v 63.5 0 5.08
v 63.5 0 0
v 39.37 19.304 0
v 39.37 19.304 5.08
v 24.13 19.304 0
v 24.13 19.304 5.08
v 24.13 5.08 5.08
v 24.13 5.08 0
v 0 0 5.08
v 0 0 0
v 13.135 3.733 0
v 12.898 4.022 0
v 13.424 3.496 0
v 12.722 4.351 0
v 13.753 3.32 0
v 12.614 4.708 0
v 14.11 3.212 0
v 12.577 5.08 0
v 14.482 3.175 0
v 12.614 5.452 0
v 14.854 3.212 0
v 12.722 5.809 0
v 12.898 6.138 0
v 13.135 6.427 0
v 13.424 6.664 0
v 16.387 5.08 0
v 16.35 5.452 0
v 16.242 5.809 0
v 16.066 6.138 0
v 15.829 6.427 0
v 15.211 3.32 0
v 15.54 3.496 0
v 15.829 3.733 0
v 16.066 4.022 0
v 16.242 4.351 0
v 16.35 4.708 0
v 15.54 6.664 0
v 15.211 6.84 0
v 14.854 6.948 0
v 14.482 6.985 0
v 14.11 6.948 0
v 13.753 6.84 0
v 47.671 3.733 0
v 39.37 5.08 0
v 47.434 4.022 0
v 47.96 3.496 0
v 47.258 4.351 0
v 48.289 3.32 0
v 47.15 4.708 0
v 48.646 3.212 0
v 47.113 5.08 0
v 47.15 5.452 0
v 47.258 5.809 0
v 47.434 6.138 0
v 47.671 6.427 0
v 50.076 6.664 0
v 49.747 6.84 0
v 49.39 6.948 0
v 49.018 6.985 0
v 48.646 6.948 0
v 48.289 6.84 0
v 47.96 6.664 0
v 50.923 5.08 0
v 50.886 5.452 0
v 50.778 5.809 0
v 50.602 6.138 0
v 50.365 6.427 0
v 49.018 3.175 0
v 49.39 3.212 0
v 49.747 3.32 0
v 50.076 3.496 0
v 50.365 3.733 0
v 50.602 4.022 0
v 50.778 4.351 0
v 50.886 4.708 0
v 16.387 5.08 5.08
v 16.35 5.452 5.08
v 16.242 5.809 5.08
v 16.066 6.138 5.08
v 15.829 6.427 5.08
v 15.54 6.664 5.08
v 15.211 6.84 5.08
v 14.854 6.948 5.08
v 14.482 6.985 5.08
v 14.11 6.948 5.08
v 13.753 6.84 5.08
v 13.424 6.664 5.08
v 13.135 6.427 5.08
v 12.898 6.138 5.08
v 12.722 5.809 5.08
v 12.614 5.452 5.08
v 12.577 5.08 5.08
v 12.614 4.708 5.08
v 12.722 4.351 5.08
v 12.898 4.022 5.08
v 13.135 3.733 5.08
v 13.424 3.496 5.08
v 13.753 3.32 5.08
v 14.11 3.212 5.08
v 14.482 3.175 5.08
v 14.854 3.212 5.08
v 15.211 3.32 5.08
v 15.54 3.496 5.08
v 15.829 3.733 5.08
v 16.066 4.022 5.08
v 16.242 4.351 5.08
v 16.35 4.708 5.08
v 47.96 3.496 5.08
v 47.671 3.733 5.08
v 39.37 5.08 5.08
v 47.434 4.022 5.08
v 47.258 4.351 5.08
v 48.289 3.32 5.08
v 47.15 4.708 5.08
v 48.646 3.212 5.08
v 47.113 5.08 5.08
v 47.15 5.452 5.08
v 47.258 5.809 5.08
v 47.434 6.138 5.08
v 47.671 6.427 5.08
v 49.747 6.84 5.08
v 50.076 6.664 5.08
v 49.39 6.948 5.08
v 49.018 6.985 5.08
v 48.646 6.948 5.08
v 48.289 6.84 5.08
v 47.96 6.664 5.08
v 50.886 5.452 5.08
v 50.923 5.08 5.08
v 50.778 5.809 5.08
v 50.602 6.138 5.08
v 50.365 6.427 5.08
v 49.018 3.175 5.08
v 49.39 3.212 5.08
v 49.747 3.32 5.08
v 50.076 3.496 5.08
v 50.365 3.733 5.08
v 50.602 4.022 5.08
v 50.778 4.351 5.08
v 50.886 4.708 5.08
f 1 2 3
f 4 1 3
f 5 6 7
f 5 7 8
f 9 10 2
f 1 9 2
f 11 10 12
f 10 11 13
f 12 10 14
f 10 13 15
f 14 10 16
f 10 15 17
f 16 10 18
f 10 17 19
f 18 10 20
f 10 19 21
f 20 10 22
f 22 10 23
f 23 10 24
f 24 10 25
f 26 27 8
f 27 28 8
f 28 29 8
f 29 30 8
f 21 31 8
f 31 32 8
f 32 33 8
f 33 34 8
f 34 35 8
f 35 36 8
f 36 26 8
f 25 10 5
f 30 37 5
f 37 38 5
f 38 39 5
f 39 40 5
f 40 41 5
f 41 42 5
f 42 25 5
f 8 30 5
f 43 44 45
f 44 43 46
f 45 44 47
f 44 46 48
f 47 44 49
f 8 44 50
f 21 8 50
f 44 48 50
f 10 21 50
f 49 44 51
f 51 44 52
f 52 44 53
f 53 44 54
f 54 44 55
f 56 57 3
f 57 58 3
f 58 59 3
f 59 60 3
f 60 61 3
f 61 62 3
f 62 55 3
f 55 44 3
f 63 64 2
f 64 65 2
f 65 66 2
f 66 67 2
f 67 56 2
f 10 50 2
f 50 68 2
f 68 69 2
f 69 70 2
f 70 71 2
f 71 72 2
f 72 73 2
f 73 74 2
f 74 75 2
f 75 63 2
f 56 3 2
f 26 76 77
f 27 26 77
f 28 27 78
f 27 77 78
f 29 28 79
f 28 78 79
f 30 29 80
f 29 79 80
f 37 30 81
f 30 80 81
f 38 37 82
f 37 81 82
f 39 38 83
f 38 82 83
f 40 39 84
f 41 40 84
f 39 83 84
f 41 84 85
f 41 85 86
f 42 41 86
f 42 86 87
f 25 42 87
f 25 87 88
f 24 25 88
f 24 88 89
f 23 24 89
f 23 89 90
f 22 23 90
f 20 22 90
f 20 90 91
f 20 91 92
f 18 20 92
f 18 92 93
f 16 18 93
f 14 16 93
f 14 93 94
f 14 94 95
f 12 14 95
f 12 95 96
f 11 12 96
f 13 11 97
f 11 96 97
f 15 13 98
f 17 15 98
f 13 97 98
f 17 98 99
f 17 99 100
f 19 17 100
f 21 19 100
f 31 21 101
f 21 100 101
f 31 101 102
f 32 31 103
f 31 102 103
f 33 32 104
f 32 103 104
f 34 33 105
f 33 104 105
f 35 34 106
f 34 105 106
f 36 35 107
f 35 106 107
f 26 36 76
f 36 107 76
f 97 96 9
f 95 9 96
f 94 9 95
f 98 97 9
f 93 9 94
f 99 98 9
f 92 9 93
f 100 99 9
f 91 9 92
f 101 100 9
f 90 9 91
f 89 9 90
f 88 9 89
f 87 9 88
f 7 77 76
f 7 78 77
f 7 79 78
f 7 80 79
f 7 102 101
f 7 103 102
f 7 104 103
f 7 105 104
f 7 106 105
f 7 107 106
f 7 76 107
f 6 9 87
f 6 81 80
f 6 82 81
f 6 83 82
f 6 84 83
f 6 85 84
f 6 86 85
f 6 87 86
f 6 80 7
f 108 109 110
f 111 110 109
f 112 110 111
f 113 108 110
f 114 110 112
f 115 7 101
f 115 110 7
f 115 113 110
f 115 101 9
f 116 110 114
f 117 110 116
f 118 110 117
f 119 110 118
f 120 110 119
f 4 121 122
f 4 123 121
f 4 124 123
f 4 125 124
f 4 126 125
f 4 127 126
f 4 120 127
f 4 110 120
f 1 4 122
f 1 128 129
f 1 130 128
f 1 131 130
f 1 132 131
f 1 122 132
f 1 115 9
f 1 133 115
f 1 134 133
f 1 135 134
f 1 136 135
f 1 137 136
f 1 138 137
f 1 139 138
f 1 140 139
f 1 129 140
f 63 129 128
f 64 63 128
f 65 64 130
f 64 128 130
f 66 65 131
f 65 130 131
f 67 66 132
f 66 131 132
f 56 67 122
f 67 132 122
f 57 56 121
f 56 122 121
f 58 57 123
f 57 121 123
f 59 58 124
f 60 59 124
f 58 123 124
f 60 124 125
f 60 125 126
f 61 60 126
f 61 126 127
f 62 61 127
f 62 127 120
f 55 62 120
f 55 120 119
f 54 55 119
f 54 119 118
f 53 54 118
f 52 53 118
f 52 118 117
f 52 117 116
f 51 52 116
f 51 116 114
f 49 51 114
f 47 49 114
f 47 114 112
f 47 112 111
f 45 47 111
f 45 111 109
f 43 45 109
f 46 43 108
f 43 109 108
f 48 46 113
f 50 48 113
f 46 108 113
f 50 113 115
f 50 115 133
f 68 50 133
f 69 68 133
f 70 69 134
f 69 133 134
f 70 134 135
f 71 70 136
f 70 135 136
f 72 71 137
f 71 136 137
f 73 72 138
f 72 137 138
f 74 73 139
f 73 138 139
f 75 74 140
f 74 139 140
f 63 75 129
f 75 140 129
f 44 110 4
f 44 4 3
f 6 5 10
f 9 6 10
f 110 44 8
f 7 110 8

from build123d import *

# Parameters (mm, degrees)
BOSS_EXTRUDE1_DEPTH = 5.08
SKETCH2_R           = 1.905
CUT_EXTRUDE1_DEPTH  = 6.08
SKETCH5_W           = 15.24
SKETCH5_H           = 5.08
CUT_EXTRUDE2_DEPTH  = 21.32


with BuildPart() as part:
    # Sketch1 → Boss-Extrude1 (new body)
    with BuildSketch(Plane.XY):
        Polygon((0, 0), (63.5, 0), (31.75, 25.4), align=None)
    extrude(amount=BOSS_EXTRUDE1_DEPTH)

    # Sketch2 → Cut-Extrude1 (cut, through all)
    with BuildSketch(Plane.XY.offset(5.08)):
        with Locations((14.481967782, 5.08)):
            Circle(SKETCH2_R)
        with Locations((49.018032218, 5.08)):
            Circle(SKETCH2_R)
    extrude(amount=-CUT_EXTRUDE1_DEPTH, mode=Mode.SUBTRACT)

    # Sketch5 → Cut-Extrude2 (cut, through all)
    with BuildSketch(Plane(origin=(0, 5.08, 0), x_dir=(-1, 0, 0), z_dir=(0, -1, 0))):
        with Locations((-31.75, -2.54)):
            Rectangle(SKETCH5_W, SKETCH5_H)
    extrude(amount=-CUT_EXTRUDE2_DEPTH, mode=Mode.SUBTRACT)


solid = part.part
